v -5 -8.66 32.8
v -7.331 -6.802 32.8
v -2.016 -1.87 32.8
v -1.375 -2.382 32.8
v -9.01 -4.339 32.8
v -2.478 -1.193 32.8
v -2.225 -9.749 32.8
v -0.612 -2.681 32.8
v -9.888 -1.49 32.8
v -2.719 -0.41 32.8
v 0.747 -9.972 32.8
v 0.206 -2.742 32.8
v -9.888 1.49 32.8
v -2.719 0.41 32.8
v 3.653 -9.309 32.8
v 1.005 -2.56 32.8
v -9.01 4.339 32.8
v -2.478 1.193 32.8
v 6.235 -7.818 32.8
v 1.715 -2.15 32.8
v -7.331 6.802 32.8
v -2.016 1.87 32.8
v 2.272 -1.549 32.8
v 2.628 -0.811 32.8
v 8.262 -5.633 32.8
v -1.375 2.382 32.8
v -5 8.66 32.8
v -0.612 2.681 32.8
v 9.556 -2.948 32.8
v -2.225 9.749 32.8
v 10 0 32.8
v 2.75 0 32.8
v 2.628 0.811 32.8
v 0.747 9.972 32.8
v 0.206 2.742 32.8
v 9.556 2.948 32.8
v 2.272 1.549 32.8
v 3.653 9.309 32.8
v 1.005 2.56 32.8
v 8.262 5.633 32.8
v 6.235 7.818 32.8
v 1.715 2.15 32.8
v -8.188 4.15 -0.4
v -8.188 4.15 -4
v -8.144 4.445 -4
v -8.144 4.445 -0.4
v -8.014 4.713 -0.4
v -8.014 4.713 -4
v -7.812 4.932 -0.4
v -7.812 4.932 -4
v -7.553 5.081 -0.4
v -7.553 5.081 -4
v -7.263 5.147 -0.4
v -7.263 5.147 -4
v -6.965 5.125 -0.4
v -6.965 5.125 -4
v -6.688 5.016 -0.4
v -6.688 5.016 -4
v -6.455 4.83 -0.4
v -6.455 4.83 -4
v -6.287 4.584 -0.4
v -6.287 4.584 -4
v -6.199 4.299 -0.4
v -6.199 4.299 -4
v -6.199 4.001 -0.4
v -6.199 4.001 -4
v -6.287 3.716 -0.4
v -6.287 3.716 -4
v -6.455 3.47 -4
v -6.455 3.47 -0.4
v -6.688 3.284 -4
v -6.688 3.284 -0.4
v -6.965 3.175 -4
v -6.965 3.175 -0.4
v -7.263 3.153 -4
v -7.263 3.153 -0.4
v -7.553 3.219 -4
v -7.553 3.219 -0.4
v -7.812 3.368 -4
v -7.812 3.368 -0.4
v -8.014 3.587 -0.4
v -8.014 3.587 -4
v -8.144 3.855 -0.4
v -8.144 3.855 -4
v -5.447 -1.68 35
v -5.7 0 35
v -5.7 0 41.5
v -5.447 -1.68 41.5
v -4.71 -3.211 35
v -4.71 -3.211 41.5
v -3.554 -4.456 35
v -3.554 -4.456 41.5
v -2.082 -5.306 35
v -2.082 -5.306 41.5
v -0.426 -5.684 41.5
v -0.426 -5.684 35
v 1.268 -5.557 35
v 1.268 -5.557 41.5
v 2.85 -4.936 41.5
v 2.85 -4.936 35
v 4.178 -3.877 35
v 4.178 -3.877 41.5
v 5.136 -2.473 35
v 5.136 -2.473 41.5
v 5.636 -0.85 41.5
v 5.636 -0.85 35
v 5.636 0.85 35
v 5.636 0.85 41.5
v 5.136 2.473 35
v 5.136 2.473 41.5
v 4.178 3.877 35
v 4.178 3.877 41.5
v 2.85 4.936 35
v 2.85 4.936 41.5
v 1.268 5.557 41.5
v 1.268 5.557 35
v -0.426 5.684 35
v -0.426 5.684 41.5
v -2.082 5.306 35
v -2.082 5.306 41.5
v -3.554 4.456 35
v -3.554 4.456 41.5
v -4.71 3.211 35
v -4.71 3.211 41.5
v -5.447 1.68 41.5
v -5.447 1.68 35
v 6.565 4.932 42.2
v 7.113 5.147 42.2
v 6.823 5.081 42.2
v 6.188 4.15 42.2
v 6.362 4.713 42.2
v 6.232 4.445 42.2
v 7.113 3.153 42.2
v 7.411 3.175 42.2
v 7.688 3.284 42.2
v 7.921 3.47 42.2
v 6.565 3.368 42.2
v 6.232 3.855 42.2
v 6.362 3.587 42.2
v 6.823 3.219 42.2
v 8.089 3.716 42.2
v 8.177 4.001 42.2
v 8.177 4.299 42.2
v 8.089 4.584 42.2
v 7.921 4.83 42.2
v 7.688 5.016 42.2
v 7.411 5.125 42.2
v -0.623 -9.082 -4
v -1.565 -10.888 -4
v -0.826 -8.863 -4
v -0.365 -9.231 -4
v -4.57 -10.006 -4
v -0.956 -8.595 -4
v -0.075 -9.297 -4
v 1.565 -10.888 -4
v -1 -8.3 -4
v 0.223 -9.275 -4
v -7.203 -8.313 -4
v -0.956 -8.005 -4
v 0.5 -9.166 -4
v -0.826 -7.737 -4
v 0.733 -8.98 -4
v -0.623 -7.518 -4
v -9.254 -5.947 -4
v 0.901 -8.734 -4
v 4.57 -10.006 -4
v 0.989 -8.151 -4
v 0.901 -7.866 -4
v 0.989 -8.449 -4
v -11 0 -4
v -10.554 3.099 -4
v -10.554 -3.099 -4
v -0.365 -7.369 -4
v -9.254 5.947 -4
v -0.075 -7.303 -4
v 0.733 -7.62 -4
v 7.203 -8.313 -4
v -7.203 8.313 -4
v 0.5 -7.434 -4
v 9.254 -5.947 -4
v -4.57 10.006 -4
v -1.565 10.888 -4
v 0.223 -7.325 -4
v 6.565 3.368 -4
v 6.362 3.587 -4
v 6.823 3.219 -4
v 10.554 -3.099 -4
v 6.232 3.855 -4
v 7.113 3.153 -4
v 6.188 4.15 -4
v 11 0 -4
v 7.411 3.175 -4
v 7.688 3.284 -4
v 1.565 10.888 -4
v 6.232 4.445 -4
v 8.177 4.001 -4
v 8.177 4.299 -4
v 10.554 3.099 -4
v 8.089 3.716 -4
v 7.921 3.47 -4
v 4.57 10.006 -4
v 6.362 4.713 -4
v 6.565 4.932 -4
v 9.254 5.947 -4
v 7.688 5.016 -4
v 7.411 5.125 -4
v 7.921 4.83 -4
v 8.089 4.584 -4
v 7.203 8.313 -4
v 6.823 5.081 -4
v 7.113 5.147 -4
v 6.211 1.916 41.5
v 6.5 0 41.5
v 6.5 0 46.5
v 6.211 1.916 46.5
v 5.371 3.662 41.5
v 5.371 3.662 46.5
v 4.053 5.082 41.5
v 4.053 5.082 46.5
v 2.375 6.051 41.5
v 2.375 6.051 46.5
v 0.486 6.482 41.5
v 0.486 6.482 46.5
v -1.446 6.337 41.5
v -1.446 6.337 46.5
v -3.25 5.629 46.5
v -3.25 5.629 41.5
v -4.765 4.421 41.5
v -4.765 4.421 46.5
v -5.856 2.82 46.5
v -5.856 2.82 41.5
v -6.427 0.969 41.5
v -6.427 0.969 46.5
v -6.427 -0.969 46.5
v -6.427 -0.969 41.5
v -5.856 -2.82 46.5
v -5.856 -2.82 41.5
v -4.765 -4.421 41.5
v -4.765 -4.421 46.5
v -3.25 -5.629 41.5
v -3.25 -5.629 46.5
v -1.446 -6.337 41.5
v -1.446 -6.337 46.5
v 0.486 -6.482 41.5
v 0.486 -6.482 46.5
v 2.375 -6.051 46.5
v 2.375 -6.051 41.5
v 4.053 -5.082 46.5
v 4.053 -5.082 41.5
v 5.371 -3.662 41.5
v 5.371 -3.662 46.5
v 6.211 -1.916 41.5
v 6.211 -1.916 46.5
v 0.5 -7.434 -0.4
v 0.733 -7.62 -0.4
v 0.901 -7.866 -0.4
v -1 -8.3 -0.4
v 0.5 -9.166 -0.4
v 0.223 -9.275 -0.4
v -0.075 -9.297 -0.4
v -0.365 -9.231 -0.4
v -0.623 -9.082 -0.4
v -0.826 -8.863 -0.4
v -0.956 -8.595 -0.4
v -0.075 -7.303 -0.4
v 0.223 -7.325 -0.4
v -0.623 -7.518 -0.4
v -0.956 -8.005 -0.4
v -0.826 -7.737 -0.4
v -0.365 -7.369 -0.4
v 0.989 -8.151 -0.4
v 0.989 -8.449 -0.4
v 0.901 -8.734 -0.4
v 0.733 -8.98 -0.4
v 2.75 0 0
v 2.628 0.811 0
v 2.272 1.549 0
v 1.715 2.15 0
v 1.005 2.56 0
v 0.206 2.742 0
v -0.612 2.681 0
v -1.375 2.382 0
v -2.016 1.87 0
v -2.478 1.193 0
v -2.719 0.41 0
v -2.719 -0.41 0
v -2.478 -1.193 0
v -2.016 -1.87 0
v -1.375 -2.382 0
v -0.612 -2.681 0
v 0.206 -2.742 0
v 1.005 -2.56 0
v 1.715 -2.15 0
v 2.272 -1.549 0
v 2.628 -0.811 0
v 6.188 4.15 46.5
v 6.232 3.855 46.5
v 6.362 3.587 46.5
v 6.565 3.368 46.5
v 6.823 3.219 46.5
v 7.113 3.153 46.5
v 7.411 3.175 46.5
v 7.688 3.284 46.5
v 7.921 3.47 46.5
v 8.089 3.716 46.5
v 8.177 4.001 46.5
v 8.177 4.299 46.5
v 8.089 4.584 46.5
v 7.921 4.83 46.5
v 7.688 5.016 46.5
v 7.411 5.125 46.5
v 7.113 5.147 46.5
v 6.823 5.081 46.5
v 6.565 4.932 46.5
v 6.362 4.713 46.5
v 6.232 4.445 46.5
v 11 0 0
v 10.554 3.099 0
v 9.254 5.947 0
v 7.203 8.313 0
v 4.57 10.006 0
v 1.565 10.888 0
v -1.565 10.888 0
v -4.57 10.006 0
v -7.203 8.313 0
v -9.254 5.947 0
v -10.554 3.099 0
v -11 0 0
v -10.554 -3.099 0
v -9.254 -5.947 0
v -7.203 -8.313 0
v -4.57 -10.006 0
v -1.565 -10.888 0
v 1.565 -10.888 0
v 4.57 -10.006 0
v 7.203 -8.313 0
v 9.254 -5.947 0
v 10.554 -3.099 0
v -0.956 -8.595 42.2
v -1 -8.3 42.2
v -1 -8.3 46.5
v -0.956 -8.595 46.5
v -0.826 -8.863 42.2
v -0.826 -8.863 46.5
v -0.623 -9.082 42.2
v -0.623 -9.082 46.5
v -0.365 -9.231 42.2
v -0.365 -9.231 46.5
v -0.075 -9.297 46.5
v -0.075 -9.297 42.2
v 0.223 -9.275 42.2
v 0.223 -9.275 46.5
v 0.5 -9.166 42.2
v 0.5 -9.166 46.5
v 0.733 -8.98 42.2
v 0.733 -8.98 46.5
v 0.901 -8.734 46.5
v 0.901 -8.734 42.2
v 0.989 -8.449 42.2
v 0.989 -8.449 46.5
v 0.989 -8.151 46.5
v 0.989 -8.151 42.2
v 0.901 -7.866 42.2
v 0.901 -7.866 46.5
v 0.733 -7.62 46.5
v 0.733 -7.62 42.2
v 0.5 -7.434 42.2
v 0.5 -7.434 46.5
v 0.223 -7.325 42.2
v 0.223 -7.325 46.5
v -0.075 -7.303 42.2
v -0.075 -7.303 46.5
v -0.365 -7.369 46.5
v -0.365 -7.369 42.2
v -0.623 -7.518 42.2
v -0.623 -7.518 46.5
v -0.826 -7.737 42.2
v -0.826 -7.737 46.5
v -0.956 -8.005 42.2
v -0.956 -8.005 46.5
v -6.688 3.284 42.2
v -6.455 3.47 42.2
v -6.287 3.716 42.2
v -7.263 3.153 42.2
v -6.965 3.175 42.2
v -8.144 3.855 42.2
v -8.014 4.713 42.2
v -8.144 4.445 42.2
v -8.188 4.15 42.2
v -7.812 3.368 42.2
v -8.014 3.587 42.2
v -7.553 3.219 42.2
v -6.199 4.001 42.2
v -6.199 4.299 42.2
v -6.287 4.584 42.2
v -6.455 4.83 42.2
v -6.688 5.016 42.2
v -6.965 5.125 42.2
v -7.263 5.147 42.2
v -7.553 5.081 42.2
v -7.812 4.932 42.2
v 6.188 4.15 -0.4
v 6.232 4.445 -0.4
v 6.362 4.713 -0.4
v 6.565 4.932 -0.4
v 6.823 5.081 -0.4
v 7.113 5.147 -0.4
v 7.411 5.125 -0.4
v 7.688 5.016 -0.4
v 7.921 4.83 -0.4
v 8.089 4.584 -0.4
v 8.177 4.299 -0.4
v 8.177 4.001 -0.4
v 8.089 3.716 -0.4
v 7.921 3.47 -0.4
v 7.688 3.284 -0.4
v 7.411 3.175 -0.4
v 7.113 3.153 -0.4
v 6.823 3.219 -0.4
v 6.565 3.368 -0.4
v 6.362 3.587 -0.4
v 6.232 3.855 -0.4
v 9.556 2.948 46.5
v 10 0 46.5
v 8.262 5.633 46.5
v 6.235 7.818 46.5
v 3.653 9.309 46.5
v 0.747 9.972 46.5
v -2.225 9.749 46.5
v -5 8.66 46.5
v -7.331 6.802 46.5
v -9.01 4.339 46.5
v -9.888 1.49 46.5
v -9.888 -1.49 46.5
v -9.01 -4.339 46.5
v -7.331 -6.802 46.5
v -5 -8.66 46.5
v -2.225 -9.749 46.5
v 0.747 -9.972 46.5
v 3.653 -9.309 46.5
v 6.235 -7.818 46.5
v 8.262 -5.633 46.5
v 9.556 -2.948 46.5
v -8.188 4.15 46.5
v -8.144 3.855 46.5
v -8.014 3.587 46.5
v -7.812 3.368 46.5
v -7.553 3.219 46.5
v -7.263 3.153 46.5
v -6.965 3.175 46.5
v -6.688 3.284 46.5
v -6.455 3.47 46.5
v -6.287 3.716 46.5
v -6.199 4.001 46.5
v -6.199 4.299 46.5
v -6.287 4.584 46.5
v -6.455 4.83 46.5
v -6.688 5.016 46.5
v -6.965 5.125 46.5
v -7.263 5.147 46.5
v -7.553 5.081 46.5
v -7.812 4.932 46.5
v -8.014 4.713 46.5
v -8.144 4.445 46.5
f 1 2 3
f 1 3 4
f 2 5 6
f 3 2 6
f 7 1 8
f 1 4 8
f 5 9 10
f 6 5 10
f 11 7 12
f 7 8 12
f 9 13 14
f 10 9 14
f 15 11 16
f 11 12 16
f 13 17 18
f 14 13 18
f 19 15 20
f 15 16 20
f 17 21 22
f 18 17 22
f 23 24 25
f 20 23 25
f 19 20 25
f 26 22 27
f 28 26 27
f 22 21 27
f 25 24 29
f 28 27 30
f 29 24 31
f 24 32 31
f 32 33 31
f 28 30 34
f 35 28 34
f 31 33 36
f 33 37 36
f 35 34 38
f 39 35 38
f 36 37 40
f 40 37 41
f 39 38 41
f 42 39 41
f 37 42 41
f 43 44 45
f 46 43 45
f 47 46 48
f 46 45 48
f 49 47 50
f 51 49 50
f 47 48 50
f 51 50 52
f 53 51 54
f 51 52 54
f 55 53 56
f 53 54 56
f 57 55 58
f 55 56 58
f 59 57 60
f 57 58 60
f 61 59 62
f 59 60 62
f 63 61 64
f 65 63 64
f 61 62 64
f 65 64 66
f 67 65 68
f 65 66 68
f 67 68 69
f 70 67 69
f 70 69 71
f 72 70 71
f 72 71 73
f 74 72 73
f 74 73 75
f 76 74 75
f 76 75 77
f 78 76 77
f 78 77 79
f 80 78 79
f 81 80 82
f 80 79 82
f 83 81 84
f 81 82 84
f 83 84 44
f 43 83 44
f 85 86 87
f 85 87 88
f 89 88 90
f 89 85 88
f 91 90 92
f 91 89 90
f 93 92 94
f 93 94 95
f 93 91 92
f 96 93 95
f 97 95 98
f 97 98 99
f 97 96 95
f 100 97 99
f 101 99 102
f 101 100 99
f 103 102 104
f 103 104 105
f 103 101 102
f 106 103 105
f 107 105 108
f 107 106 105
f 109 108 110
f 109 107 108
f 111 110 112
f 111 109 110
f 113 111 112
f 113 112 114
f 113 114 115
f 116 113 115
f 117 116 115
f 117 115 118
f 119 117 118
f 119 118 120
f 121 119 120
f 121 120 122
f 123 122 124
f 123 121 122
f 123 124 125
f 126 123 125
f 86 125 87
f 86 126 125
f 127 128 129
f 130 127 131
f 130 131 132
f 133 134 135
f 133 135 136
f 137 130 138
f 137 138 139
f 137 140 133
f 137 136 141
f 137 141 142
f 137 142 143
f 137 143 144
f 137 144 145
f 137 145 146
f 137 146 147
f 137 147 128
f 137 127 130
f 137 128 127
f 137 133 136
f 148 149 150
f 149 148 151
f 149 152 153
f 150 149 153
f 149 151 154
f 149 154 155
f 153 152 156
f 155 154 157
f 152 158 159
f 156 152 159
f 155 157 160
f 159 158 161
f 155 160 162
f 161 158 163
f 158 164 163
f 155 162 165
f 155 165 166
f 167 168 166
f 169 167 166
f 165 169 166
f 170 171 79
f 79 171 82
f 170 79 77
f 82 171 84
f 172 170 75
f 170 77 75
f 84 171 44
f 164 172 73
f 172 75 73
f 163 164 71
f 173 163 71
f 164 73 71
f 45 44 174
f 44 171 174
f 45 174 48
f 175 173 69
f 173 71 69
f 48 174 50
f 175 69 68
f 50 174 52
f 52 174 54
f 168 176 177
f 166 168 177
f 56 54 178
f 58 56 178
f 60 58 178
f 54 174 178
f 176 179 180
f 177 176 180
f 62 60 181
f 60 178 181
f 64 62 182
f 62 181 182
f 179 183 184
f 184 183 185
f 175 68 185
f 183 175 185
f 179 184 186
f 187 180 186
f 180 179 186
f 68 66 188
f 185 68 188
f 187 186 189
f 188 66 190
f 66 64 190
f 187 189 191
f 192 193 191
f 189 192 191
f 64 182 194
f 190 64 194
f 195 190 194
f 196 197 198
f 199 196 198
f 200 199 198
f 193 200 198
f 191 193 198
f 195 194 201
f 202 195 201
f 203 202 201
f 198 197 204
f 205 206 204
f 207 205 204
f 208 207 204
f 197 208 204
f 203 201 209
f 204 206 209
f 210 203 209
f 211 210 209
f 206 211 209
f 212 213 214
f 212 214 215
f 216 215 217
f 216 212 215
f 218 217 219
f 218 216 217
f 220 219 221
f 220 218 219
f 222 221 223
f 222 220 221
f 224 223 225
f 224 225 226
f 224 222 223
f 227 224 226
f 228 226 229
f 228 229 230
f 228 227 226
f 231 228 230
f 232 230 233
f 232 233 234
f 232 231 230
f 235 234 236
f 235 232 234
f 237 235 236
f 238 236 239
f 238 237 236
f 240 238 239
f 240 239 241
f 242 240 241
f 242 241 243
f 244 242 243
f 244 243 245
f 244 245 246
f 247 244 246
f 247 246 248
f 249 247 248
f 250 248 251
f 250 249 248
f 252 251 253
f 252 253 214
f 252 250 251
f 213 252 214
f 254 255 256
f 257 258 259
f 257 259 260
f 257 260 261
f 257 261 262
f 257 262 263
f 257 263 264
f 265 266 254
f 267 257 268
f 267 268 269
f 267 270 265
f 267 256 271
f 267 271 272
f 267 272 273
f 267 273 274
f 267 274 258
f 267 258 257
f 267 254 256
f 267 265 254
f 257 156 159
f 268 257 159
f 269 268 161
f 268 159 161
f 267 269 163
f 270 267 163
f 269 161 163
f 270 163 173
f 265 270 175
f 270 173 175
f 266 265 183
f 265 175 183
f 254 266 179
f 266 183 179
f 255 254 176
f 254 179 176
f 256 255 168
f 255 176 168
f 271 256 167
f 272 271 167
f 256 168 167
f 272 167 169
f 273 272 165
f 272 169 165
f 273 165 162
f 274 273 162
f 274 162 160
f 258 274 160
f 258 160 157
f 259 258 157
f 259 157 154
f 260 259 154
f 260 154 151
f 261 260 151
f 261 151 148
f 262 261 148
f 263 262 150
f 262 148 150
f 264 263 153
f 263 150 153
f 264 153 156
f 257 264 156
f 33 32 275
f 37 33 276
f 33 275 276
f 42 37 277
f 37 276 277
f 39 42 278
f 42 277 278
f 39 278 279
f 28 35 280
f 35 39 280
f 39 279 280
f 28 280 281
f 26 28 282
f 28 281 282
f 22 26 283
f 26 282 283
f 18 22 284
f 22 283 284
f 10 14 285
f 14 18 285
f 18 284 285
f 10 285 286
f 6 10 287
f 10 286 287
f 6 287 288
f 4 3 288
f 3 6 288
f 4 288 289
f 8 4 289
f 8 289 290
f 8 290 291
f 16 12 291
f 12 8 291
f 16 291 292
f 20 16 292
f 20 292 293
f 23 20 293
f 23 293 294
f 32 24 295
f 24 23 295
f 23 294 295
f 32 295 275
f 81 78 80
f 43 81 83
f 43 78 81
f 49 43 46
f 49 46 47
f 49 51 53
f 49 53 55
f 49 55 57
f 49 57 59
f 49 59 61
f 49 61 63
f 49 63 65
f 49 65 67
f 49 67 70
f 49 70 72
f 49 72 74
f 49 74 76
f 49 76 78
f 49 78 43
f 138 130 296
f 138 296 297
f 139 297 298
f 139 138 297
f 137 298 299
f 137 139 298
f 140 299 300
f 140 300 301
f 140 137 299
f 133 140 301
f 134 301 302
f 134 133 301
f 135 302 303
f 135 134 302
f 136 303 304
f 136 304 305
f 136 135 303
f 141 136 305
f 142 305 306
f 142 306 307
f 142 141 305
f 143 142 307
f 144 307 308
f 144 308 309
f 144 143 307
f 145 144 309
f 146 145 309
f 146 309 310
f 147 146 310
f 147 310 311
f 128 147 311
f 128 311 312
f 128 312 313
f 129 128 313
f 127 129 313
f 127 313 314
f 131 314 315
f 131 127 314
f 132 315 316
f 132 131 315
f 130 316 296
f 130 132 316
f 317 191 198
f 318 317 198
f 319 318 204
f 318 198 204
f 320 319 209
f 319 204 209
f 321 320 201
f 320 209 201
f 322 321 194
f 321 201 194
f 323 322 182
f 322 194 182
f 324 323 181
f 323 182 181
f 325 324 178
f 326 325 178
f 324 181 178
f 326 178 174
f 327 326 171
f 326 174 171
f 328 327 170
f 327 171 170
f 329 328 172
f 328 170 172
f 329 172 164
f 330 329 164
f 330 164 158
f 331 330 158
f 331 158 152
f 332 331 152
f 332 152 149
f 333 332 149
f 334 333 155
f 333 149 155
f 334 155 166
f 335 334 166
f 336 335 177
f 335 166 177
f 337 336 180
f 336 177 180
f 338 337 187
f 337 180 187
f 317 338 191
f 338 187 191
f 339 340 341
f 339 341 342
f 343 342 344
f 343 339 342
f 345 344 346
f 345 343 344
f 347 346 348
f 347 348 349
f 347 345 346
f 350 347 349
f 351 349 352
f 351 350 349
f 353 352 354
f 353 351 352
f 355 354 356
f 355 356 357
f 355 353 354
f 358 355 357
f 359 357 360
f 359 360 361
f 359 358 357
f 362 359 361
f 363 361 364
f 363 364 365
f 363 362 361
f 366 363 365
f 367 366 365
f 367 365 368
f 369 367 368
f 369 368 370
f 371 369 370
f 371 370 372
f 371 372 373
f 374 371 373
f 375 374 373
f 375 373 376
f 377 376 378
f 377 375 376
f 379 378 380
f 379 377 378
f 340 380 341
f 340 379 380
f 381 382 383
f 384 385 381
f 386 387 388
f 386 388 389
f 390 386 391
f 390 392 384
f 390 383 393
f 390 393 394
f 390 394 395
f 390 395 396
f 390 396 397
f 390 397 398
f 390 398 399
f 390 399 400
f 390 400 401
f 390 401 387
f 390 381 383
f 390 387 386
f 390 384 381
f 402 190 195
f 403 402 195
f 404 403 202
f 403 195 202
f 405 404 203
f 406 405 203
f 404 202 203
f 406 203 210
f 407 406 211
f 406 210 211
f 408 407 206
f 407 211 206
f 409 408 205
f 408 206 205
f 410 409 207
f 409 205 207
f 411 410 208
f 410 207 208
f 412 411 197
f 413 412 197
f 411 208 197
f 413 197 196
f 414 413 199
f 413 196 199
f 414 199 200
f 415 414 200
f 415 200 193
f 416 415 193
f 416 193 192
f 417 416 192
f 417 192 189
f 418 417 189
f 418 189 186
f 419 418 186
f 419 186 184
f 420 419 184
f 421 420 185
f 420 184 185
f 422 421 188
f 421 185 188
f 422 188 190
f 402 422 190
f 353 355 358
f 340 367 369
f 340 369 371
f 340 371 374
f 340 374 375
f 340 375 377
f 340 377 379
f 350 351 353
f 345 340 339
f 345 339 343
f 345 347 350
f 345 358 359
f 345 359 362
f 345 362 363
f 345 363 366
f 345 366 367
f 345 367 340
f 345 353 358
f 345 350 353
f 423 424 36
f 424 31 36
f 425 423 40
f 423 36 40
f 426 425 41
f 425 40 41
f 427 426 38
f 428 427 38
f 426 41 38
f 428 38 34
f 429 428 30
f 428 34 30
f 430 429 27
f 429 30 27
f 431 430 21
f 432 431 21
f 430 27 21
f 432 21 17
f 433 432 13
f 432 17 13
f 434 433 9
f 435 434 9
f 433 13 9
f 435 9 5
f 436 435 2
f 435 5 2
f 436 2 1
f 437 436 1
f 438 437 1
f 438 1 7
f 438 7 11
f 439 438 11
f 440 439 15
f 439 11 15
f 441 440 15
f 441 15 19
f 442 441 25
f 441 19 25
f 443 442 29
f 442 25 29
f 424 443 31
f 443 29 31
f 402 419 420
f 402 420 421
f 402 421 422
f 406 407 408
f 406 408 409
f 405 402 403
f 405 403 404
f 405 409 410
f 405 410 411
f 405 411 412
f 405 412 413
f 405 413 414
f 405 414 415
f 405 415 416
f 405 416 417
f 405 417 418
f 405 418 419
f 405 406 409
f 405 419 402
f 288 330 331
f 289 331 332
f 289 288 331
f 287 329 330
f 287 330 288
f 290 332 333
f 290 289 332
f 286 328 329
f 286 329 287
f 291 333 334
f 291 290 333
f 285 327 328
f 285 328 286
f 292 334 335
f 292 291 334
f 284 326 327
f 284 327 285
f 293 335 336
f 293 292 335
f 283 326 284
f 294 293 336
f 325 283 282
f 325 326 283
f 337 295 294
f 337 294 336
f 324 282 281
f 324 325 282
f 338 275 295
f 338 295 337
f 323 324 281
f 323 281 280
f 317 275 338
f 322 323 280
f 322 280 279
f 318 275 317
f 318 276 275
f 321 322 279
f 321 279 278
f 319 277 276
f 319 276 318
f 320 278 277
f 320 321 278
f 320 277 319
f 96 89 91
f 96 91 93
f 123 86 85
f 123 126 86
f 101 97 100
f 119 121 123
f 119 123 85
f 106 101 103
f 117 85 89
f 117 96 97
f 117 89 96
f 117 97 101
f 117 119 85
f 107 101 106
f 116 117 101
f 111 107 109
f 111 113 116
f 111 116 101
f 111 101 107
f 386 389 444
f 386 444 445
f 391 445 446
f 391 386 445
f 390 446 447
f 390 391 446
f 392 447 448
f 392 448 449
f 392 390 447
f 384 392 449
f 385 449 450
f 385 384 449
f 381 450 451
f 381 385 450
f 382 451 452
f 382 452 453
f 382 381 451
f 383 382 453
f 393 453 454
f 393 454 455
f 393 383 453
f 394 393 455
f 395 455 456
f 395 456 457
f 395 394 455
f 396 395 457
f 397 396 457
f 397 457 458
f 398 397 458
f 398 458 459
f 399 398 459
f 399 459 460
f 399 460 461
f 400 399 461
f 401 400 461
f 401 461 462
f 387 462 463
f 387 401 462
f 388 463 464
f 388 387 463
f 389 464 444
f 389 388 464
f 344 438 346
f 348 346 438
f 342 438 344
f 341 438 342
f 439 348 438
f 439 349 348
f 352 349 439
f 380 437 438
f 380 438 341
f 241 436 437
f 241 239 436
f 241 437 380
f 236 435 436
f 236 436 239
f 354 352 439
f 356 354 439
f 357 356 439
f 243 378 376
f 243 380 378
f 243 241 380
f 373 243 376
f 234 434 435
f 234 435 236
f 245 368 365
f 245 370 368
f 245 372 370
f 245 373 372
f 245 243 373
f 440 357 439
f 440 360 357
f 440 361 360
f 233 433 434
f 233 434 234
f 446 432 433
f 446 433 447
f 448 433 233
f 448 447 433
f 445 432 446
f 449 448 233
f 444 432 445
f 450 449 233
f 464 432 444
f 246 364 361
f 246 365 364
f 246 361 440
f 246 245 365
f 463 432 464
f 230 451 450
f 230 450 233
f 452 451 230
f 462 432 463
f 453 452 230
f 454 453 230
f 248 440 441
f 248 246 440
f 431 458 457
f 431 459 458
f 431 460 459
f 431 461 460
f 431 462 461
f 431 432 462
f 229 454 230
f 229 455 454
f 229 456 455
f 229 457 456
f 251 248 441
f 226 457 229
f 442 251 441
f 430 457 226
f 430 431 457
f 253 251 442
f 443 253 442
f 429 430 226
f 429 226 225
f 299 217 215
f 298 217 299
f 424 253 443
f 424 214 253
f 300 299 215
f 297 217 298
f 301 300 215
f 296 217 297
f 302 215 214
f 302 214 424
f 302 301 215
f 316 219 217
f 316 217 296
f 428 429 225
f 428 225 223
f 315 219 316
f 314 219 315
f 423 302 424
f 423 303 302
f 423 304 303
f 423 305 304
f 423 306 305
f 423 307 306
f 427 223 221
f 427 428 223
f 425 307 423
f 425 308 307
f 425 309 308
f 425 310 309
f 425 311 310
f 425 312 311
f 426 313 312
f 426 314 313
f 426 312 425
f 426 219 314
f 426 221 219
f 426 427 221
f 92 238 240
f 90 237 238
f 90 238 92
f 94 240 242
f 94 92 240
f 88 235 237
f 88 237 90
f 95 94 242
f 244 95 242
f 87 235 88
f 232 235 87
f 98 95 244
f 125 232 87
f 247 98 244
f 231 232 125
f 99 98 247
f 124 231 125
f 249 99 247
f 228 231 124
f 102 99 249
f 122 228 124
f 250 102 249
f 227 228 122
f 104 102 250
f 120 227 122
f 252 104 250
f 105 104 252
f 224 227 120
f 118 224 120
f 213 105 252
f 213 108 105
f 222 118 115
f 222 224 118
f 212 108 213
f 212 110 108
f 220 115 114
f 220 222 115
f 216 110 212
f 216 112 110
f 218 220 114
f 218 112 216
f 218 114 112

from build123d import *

# Parameters (mm, degrees)
MOUNTING_FLANGE_START                          = -4
SKETCH1_R                                      = 11
MOUNTING_FLANGE_DEPTH                          = 4
SKETCH2_R                                      = 2.75
D5P5_CENTRAL_POST_DEPTH                        = 32.81
CLOSED_FLOOR_BELOW_SHAFT_NOSE_START            = 32.8
SKETCH3_R                                      = 10
CLOSED_FLOOR_BELOW_SHAFT_NOSE_DEPTH            = 2.2
SHAFT_AND_CLIP_CLEARANCE_START                 = 35
SKETCH4_R                                      = 10
SKETCH4_R_2                                    = 5.7
SHAFT_AND_CLIP_CLEARANCE_DEPTH                 = 6.5
LOWER_686ZZ_SEAT_START                         = 41.5
SKETCH5_R                                      = 10
SKETCH5_R_2                                    = 6.5
LOWER_686ZZ_SEAT_DEPTH                         = 5
SKETCH6_R                                      = 1
BASE_THREE_M2_BLIND_THREAD_MAJOR_ENVELOP_DEPTH = 3.6
TOP_CAP_THREE_M2_BLIND_THREAD_MAJOR_ENVE_START = -4.3
SKETCH7_R                                      = 1
TOP_CAP_THREE_M2_BLIND_THREAD_MAJOR_ENVE_DEPTH = 4.3


with BuildPart() as part:
    # Sketch1 → Mounting_Flange (new body)
    with BuildSketch(Plane.XY.offset(MOUNTING_FLANGE_START)):
        Circle(SKETCH1_R)
    extrude(amount=MOUNTING_FLANGE_DEPTH)

    # Sketch2 → D5p5_Central_Post (add)
    with BuildSketch(Plane.XY):
        Circle(SKETCH2_R)
    extrude(amount=D5P5_CENTRAL_POST_DEPTH)

    # Sketch3 → Closed_Floor_Below_Shaft_Nose (add)
    with BuildSketch(Plane.XY.offset(CLOSED_FLOOR_BELOW_SHAFT_NOSE_START)):
        Circle(SKETCH3_R)
    extrude(amount=CLOSED_FLOOR_BELOW_SHAFT_NOSE_DEPTH)

    # Sketch4 → Shaft_And_Clip_Clearance (add)
    with BuildSketch(Plane.XY.offset(SHAFT_AND_CLIP_CLEARANCE_START)):
        Circle(SKETCH4_R)
        with Locations(Location((0, 0, 0), (0, 0, 180))):
            Circle(SKETCH4_R_2, mode=Mode.SUBTRACT)
    extrude(amount=SHAFT_AND_CLIP_CLEARANCE_DEPTH)

    # Sketch5 → Lower_686ZZ_Seat (add)
    with BuildSketch(Plane.XY.offset(LOWER_686ZZ_SEAT_START)):
        Circle(SKETCH5_R)
        Circle(SKETCH5_R_2, mode=Mode.SUBTRACT)
    extrude(amount=LOWER_686ZZ_SEAT_DEPTH)

    # Sketch6 → Base_Three_M2_Blind_Thread_Major_Envelopes (cut)
    with BuildSketch(Plane(origin=(0, 0, -4), x_dir=(-1, 0, 0), z_dir=(0, 0, -1))):
        with Locations((-7.188010851, 4.15)):
            Circle(SKETCH6_R)
        with Locations((7.188010851, 4.15)):
            Circle(SKETCH6_R)
        with Locations((0, -8.3)):
            Circle(SKETCH6_R)
    extrude(amount=-BASE_THREE_M2_BLIND_THREAD_MAJOR_ENVELOP_DEPTH, mode=Mode.SUBTRACT)

    # Sketch7 → Top_Cap_Three_M2_Blind_Thread_Major_Envelopes (cut)
    with BuildSketch(Plane.XY.offset(46.5).offset(TOP_CAP_THREE_M2_BLIND_THREAD_MAJOR_ENVE_START)):
        with Locations(Location((7.188010851, 4.15, 0), (0, 0, 180))):
            Circle(SKETCH7_R)
        with Locations(Location((-7.188010851, 4.15, 0), (0, 0, 180))):
            Circle(SKETCH7_R)
        with Locations(Location((0, -8.3, 0), (0, 0, 180))):
            Circle(SKETCH7_R)
    extrude(amount=TOP_CAP_THREE_M2_BLIND_THREAD_MAJOR_ENVE_DEPTH, mode=Mode.SUBTRACT)


solid = part.part
